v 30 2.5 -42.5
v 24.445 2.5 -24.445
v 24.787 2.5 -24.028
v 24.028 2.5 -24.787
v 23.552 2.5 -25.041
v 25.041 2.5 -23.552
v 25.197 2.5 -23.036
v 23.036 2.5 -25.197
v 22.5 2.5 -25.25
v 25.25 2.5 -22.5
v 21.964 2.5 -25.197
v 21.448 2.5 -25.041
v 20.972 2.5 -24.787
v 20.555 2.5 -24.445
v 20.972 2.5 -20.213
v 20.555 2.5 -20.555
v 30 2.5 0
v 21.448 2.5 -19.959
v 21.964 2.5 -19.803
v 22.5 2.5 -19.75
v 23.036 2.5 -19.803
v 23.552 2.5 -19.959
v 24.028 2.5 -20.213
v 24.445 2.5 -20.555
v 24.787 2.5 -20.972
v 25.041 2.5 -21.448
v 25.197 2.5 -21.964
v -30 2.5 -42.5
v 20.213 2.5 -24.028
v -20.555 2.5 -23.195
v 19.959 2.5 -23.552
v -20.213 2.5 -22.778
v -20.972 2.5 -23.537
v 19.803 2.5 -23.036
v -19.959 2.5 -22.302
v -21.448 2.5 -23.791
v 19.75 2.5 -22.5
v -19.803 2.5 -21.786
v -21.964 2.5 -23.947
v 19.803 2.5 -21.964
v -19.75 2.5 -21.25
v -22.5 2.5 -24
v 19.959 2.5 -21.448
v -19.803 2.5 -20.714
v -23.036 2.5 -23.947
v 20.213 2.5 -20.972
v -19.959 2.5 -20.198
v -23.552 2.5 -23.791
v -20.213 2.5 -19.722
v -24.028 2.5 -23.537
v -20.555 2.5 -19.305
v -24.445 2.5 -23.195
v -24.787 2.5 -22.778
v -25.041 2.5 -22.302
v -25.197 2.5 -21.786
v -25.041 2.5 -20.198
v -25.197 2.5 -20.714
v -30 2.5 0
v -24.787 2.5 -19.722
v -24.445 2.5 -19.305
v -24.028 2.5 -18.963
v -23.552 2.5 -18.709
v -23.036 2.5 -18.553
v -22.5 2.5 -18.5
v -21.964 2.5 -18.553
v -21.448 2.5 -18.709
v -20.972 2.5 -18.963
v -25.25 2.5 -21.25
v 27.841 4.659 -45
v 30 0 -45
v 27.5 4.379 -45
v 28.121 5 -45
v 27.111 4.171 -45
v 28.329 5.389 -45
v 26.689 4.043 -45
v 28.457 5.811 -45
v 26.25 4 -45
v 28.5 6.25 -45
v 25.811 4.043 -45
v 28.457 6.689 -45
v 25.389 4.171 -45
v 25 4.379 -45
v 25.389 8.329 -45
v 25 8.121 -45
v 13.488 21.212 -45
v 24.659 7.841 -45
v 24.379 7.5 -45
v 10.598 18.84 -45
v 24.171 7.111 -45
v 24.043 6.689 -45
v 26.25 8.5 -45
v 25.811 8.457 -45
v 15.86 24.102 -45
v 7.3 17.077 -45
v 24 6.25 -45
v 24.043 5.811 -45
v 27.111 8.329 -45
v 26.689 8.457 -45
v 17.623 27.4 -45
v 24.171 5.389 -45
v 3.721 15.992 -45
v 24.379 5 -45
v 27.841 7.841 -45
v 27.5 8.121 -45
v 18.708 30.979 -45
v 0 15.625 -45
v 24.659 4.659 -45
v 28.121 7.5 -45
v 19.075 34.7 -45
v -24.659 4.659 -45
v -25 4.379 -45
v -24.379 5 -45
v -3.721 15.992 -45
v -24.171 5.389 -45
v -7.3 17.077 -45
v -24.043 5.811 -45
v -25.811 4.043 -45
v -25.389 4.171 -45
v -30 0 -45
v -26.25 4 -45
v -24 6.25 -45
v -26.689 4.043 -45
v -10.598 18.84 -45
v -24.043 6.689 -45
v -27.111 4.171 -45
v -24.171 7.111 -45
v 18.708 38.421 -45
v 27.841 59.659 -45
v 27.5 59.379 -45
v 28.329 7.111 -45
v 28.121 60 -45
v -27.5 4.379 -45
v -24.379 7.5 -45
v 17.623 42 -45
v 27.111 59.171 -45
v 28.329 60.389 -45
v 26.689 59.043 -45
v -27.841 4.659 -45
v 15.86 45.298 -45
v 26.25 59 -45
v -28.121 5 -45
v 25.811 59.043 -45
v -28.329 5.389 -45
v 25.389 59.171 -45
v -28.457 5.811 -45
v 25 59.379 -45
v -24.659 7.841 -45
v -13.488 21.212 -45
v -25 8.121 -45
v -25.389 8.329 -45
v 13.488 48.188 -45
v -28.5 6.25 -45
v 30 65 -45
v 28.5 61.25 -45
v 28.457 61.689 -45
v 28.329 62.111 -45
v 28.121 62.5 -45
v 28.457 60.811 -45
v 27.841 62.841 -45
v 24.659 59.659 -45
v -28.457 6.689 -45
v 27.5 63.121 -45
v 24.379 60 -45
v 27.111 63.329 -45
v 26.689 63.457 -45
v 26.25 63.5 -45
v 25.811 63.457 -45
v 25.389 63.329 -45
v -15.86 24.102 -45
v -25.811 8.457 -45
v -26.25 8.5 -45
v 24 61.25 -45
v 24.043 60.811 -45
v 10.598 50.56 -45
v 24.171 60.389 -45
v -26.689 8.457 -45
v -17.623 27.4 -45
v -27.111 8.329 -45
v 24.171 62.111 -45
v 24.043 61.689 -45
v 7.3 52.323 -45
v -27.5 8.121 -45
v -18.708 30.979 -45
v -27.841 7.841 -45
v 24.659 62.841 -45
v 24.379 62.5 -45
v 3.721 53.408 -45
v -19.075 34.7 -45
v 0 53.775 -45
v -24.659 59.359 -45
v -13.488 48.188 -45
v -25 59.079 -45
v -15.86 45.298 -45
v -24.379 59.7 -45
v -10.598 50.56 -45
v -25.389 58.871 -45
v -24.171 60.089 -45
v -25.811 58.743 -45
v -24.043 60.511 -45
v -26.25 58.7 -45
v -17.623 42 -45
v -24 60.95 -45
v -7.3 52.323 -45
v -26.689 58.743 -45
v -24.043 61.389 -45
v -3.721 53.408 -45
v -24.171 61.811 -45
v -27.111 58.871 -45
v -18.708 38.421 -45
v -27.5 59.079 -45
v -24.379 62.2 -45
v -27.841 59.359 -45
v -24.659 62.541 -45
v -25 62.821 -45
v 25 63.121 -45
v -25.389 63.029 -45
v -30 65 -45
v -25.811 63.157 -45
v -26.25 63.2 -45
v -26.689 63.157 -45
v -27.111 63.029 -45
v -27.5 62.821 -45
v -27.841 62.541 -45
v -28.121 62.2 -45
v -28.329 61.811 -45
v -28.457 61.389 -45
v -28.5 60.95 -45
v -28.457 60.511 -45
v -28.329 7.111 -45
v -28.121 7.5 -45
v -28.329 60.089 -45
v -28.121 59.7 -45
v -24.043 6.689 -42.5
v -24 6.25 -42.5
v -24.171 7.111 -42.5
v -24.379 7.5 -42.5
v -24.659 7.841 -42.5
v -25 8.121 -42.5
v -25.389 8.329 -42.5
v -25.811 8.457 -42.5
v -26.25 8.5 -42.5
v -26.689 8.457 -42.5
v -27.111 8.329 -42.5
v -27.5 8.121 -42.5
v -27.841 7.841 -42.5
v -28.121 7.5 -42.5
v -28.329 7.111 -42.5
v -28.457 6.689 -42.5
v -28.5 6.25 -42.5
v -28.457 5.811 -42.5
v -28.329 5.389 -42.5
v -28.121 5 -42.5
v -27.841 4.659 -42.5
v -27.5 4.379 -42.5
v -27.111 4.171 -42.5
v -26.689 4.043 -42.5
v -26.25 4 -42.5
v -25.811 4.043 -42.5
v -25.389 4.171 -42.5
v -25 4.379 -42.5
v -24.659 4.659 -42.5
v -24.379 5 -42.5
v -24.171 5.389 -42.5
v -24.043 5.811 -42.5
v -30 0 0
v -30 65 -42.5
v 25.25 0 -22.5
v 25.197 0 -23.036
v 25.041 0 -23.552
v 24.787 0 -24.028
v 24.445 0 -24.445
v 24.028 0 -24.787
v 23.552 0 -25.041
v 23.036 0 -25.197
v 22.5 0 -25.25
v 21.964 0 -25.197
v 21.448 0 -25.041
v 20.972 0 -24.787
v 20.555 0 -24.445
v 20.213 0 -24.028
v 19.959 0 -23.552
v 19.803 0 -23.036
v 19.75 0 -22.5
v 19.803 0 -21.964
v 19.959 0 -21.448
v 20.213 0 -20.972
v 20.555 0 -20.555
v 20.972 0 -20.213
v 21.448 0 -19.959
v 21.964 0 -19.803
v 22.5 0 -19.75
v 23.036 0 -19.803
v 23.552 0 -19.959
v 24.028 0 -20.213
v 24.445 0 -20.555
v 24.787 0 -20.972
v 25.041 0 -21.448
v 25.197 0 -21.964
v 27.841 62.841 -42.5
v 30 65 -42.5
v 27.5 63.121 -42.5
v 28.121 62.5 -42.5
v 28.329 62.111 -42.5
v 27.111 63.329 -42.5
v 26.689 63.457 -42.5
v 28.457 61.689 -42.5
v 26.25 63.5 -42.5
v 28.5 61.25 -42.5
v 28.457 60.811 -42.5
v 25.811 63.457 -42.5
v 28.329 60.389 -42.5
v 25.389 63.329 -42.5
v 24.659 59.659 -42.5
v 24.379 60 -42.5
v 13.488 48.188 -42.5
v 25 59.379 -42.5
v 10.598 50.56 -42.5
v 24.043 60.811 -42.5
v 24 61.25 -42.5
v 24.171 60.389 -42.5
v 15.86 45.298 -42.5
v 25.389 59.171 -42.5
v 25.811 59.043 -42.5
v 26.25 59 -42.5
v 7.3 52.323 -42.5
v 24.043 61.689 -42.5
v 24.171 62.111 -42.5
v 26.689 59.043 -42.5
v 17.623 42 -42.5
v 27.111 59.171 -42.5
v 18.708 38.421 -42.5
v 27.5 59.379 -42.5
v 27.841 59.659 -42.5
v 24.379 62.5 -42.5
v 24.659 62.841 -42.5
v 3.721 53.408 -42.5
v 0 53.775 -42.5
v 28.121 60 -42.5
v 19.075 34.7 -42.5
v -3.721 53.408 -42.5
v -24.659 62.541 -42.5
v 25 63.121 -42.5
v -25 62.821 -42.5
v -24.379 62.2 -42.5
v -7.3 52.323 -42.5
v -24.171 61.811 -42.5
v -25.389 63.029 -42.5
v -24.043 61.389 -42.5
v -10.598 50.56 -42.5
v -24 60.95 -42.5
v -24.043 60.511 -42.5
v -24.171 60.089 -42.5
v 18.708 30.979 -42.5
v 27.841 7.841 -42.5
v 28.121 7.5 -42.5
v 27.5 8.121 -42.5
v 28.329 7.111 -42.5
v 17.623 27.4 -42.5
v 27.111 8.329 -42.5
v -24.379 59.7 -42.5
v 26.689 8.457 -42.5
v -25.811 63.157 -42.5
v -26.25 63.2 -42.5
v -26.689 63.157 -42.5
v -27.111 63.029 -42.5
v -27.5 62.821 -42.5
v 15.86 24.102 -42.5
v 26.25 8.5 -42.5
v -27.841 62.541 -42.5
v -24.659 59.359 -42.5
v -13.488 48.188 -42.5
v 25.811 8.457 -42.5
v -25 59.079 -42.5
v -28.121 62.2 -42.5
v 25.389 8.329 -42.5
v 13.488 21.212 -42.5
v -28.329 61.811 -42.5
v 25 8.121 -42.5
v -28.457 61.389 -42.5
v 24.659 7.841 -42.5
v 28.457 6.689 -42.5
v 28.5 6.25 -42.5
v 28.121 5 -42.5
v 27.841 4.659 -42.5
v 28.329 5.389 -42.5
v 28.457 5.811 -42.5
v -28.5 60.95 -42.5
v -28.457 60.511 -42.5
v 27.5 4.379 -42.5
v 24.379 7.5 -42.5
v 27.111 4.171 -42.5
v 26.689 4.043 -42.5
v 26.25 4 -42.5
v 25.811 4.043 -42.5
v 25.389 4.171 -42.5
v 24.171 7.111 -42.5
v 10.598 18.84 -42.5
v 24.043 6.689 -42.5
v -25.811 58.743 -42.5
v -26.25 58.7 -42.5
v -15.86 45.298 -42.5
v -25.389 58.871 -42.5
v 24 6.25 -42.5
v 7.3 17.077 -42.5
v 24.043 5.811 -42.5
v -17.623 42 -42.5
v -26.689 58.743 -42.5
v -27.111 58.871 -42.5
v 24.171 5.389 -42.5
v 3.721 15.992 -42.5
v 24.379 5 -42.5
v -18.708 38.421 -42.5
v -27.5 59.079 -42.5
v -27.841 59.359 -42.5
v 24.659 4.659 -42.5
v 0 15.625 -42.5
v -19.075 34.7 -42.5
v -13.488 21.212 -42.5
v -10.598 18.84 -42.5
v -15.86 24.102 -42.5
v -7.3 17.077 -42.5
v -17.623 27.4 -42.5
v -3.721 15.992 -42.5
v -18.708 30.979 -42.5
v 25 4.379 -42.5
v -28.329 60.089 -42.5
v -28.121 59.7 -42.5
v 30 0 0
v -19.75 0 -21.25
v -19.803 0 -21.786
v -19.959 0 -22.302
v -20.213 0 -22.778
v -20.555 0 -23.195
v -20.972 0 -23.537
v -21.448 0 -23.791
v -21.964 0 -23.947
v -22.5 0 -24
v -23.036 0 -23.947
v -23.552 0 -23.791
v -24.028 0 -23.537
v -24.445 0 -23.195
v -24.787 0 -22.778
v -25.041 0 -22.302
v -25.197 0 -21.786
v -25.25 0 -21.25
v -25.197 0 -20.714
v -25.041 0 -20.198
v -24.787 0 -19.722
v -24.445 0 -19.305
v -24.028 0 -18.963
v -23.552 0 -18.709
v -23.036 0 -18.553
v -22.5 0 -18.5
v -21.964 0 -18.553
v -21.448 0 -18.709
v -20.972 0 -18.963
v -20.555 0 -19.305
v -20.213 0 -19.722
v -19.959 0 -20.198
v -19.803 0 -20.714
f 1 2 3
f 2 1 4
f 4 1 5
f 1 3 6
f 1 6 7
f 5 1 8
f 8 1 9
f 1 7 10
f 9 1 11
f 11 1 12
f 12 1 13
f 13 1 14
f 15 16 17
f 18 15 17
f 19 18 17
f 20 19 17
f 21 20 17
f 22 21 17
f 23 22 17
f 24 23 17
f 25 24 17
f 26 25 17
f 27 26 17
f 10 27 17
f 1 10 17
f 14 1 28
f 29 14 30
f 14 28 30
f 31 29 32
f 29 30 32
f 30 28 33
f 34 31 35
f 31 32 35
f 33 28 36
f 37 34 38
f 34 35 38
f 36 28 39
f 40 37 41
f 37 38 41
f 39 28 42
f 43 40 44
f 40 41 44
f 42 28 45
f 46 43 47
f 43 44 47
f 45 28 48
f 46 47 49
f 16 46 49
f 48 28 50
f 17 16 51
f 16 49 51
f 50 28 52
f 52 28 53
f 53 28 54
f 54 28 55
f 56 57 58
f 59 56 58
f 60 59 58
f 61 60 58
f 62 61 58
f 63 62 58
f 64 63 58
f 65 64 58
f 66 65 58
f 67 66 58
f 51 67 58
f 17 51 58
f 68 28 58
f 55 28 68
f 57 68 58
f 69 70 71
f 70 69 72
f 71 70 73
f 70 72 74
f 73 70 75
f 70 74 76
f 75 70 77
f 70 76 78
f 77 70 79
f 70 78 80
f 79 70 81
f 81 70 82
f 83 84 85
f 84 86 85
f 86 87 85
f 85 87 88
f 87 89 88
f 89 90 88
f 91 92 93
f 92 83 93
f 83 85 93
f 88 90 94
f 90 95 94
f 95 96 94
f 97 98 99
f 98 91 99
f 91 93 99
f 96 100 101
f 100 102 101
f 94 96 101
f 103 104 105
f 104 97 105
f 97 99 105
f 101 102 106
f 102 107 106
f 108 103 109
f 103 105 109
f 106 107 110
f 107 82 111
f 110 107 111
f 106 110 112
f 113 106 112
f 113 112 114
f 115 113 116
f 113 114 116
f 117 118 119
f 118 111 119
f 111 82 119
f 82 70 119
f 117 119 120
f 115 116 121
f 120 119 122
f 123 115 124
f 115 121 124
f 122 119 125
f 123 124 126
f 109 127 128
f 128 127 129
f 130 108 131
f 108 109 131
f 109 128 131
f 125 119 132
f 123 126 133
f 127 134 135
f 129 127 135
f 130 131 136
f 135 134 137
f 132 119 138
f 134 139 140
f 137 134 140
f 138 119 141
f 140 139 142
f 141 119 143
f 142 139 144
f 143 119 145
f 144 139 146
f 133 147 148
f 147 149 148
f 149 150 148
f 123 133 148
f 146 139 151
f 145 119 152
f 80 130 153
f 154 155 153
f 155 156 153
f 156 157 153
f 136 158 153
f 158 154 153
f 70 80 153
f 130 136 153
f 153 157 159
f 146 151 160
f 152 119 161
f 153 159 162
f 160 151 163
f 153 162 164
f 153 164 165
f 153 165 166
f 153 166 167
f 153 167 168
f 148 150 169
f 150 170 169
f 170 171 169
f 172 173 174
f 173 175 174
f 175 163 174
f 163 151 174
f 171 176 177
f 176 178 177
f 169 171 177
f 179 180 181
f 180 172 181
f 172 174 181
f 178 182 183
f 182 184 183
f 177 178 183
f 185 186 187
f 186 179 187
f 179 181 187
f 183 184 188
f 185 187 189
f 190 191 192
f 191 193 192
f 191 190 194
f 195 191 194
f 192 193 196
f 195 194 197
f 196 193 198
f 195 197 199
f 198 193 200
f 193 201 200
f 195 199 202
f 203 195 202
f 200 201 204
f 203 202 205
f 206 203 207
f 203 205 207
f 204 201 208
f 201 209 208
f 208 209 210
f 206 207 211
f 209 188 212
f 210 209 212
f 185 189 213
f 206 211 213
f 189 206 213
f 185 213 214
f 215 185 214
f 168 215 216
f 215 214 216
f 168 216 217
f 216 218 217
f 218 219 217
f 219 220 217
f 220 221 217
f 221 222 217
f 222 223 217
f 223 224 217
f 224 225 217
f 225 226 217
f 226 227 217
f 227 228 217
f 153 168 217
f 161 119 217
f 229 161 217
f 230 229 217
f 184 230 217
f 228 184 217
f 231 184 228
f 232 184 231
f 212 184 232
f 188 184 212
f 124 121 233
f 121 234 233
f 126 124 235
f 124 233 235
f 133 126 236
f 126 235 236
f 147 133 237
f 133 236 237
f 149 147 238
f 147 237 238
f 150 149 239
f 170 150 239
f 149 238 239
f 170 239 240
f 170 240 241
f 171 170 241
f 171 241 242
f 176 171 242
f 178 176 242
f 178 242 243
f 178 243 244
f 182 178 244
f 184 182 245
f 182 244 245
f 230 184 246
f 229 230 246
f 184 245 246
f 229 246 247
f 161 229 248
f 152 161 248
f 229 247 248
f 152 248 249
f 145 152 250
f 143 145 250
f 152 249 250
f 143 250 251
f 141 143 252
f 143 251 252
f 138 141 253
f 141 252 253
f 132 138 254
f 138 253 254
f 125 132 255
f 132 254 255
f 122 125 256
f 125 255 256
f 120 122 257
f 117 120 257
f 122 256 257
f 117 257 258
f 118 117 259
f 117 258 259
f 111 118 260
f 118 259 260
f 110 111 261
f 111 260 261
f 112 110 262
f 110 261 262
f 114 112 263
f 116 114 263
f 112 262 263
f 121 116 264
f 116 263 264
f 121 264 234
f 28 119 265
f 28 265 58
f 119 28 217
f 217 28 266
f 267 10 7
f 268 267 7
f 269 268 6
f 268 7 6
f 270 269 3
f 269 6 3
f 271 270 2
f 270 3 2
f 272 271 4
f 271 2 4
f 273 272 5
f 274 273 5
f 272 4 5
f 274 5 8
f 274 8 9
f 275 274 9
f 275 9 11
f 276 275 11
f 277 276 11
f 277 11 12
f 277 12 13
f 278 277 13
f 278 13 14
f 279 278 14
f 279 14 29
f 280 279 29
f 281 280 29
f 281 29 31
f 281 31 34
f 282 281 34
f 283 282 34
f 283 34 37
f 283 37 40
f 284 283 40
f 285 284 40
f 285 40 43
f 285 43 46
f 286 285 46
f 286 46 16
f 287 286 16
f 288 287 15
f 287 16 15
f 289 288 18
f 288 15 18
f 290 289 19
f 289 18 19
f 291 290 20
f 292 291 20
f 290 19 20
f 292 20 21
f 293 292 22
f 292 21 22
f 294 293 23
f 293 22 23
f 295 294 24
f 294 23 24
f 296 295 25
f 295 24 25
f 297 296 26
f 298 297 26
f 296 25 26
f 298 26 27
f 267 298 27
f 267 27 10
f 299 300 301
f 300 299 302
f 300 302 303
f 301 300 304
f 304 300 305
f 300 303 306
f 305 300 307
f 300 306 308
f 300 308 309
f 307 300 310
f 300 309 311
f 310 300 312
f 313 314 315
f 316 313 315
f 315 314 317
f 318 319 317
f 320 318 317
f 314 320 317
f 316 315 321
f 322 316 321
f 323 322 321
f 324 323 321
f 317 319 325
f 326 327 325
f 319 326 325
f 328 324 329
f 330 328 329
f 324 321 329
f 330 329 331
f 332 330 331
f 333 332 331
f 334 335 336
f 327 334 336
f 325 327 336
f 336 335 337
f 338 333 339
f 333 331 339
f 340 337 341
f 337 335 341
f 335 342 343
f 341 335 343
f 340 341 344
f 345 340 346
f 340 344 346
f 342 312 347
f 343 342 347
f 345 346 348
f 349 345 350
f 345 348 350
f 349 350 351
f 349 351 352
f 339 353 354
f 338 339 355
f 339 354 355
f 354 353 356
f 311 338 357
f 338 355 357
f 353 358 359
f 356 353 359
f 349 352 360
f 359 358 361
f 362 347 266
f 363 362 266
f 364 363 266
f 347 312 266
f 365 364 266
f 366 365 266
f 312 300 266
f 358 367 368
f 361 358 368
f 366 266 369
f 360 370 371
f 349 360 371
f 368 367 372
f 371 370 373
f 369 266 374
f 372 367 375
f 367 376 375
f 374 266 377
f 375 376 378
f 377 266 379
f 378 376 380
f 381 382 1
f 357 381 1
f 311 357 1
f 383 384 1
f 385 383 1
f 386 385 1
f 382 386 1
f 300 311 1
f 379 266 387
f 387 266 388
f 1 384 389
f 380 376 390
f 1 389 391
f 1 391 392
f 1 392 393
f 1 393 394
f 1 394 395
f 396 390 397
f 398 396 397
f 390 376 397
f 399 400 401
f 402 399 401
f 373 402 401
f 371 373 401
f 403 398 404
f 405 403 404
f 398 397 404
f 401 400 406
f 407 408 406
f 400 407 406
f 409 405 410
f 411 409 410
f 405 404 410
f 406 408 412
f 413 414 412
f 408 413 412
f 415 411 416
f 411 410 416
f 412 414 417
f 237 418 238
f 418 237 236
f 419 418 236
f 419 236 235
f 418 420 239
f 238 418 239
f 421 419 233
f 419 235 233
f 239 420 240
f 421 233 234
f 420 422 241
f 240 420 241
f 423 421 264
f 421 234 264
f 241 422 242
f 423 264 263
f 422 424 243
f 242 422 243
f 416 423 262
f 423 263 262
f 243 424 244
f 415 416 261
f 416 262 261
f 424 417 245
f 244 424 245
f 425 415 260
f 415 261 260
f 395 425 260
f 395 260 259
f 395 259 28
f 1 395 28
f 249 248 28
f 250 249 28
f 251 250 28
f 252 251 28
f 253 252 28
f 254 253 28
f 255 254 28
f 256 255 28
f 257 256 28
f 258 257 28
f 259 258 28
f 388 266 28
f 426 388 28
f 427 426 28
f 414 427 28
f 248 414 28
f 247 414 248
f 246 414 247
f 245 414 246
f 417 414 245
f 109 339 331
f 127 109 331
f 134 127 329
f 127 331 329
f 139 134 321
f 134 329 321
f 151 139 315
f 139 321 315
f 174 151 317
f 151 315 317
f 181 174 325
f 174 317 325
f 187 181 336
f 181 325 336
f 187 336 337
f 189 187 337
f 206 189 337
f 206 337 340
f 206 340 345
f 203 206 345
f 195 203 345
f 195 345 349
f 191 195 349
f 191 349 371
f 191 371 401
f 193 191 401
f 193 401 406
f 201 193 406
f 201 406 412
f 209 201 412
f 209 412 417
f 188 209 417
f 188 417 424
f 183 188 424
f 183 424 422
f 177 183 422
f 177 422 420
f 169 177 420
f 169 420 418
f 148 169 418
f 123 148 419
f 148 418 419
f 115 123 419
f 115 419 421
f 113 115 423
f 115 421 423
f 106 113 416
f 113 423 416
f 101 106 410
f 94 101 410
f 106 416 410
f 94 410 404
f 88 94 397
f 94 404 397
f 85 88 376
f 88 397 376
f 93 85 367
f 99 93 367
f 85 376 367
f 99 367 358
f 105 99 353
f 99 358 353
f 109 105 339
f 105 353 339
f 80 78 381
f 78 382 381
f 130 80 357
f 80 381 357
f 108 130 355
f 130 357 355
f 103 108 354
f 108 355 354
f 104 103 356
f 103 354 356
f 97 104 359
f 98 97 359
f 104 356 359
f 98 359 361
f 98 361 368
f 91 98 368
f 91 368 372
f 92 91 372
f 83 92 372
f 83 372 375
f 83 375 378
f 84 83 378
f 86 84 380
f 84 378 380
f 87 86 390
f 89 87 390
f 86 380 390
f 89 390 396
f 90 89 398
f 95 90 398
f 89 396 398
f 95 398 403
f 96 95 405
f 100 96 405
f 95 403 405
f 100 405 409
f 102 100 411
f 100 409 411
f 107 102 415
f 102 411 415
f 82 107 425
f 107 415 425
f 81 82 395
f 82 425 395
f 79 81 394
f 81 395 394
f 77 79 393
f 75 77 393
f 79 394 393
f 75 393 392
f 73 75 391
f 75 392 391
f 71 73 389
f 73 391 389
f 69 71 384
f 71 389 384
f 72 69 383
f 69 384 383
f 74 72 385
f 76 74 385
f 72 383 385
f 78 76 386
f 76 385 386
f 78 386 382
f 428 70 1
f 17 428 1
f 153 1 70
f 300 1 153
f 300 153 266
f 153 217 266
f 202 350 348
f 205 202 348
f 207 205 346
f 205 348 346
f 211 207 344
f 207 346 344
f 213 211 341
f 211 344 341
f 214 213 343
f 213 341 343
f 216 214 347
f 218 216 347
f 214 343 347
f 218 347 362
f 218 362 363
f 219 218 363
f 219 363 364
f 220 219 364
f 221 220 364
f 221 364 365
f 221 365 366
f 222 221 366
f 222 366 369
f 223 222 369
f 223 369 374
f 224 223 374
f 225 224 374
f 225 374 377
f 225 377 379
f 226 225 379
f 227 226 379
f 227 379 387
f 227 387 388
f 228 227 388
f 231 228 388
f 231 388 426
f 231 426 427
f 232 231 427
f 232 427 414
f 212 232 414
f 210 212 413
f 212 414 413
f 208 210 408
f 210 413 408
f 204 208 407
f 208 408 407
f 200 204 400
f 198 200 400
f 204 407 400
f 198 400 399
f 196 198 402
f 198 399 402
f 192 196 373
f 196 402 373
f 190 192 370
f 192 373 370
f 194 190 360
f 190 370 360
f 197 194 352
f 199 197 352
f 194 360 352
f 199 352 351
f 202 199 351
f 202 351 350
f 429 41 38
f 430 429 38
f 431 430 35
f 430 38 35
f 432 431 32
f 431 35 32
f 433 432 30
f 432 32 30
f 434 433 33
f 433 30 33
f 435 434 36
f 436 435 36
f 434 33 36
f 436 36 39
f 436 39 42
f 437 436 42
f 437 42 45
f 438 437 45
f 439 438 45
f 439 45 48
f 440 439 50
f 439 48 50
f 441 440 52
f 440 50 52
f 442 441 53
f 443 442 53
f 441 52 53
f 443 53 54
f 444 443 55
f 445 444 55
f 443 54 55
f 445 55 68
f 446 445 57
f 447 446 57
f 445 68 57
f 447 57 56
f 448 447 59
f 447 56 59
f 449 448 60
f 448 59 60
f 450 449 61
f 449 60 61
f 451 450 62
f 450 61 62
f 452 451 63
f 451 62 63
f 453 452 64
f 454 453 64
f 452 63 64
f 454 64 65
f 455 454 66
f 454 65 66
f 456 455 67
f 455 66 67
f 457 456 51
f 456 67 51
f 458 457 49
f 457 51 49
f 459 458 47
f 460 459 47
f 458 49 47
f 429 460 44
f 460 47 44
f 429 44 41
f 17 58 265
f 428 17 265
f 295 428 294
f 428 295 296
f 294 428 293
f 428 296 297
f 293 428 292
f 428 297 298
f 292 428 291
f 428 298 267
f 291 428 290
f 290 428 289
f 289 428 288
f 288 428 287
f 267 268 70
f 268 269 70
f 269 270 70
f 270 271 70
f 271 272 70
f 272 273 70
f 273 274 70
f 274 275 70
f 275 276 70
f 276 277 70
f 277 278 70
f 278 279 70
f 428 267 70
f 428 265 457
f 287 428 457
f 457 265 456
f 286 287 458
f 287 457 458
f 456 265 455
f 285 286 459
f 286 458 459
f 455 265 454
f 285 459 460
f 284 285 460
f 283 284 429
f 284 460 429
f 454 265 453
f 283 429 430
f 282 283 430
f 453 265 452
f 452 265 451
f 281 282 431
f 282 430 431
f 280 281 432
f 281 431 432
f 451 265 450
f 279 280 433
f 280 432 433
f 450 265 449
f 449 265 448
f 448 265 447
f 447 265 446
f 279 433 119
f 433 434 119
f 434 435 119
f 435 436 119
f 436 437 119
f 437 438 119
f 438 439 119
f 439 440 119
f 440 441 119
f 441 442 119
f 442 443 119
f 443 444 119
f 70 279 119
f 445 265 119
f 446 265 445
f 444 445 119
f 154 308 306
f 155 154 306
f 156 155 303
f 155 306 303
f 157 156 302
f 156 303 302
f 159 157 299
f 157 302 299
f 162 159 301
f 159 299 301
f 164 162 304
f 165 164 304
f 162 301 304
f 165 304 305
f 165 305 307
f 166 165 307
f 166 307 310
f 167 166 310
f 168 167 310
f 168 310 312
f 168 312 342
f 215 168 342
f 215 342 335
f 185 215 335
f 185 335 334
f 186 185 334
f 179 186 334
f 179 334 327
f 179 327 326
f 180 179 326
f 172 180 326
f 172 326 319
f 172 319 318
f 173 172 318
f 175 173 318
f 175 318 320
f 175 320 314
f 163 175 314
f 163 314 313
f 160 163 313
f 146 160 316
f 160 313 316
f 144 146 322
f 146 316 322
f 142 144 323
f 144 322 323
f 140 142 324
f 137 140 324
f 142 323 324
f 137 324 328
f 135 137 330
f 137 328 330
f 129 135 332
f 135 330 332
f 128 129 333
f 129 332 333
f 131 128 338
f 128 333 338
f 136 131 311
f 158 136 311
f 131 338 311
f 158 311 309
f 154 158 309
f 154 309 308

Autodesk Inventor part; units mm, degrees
ref_plane "YZ Plane" through (0, 0, 0) normal (1, 0, 0) x (0, 1, 0)
ref_plane "XZ Plane" through (0, 0, 0) normal (0, 1, 0) x (-1, 0, 0)
ref_plane "XY Plane" through (0, 0, 0) normal (0, 0, 1) x (1, 0, 0)
sketch "Skizze1" plane through (0, 0, 0) normal (1, 0, 0) x (0, 1, 0)
  line L0 (0, 0) -> (0, -45)
  line L1 (0, -45) -> (65, -45)
  line L2 (65, -45) -> (65, -42.5)
  line L3 (65, -42.5) -> (2.5, -42.5)
  line L4 (2.5, -42.5) -> (2.5, 0)
  line L5 (2.5, 0) -> (0, 0)
  dimension "d0" = 45
  dimension "d1" = 65
  dimension "d2" = 2.5
  dimension "d3" = 62.5
extrude "Extrusion1" add sketch "Skizze1" along normal mid plane 60
sketch "Skizze2" plane through (-30, 2.5, 0) normal (0, 1, 0) x (1, 0, 0)
  circle A0 centre (7.5, 21.25) radius 2.75
  circle A1 centre (52.5, 22.5) radius 2.75
  point P0 (30, 0)
  dimension "d6" = 5.5
  dimension "d7" = 5.5
extrude "Extrusion2" cut sketch "Skizze2" against normal blind 3
sketch "Skizze3" plane through (-30, 2.5, -42.5) normal (0, 0, 1) x (1, 0, 0)
  circle A0 centre (30, 32.2) radius 19.075
  circle A1 centre (56.25, 58.75) radius 2.25
  line L0 (0, 62.5) -> (60, 62.5) projected
  circle A2 centre (3.75, 3.75) radius 2.25
  circle A3 centre (56.25, 3.75) radius 2.25
  circle A4 centre (3.75, 58.45) radius 2.25
  point P0 (30, -2.5)
  dimension "d10" = 38.15
  dimension "d11" = 4.5
  dimension "d12" = 3.75
  dimension "d13" = 4.5
  dimension "d14" = 4.5
  dimension "d15" = 4.5
extrude "Extrusion3" cut sketch "Skizze3" against normal blind 2.5
properties part number "Motorhalterung"
